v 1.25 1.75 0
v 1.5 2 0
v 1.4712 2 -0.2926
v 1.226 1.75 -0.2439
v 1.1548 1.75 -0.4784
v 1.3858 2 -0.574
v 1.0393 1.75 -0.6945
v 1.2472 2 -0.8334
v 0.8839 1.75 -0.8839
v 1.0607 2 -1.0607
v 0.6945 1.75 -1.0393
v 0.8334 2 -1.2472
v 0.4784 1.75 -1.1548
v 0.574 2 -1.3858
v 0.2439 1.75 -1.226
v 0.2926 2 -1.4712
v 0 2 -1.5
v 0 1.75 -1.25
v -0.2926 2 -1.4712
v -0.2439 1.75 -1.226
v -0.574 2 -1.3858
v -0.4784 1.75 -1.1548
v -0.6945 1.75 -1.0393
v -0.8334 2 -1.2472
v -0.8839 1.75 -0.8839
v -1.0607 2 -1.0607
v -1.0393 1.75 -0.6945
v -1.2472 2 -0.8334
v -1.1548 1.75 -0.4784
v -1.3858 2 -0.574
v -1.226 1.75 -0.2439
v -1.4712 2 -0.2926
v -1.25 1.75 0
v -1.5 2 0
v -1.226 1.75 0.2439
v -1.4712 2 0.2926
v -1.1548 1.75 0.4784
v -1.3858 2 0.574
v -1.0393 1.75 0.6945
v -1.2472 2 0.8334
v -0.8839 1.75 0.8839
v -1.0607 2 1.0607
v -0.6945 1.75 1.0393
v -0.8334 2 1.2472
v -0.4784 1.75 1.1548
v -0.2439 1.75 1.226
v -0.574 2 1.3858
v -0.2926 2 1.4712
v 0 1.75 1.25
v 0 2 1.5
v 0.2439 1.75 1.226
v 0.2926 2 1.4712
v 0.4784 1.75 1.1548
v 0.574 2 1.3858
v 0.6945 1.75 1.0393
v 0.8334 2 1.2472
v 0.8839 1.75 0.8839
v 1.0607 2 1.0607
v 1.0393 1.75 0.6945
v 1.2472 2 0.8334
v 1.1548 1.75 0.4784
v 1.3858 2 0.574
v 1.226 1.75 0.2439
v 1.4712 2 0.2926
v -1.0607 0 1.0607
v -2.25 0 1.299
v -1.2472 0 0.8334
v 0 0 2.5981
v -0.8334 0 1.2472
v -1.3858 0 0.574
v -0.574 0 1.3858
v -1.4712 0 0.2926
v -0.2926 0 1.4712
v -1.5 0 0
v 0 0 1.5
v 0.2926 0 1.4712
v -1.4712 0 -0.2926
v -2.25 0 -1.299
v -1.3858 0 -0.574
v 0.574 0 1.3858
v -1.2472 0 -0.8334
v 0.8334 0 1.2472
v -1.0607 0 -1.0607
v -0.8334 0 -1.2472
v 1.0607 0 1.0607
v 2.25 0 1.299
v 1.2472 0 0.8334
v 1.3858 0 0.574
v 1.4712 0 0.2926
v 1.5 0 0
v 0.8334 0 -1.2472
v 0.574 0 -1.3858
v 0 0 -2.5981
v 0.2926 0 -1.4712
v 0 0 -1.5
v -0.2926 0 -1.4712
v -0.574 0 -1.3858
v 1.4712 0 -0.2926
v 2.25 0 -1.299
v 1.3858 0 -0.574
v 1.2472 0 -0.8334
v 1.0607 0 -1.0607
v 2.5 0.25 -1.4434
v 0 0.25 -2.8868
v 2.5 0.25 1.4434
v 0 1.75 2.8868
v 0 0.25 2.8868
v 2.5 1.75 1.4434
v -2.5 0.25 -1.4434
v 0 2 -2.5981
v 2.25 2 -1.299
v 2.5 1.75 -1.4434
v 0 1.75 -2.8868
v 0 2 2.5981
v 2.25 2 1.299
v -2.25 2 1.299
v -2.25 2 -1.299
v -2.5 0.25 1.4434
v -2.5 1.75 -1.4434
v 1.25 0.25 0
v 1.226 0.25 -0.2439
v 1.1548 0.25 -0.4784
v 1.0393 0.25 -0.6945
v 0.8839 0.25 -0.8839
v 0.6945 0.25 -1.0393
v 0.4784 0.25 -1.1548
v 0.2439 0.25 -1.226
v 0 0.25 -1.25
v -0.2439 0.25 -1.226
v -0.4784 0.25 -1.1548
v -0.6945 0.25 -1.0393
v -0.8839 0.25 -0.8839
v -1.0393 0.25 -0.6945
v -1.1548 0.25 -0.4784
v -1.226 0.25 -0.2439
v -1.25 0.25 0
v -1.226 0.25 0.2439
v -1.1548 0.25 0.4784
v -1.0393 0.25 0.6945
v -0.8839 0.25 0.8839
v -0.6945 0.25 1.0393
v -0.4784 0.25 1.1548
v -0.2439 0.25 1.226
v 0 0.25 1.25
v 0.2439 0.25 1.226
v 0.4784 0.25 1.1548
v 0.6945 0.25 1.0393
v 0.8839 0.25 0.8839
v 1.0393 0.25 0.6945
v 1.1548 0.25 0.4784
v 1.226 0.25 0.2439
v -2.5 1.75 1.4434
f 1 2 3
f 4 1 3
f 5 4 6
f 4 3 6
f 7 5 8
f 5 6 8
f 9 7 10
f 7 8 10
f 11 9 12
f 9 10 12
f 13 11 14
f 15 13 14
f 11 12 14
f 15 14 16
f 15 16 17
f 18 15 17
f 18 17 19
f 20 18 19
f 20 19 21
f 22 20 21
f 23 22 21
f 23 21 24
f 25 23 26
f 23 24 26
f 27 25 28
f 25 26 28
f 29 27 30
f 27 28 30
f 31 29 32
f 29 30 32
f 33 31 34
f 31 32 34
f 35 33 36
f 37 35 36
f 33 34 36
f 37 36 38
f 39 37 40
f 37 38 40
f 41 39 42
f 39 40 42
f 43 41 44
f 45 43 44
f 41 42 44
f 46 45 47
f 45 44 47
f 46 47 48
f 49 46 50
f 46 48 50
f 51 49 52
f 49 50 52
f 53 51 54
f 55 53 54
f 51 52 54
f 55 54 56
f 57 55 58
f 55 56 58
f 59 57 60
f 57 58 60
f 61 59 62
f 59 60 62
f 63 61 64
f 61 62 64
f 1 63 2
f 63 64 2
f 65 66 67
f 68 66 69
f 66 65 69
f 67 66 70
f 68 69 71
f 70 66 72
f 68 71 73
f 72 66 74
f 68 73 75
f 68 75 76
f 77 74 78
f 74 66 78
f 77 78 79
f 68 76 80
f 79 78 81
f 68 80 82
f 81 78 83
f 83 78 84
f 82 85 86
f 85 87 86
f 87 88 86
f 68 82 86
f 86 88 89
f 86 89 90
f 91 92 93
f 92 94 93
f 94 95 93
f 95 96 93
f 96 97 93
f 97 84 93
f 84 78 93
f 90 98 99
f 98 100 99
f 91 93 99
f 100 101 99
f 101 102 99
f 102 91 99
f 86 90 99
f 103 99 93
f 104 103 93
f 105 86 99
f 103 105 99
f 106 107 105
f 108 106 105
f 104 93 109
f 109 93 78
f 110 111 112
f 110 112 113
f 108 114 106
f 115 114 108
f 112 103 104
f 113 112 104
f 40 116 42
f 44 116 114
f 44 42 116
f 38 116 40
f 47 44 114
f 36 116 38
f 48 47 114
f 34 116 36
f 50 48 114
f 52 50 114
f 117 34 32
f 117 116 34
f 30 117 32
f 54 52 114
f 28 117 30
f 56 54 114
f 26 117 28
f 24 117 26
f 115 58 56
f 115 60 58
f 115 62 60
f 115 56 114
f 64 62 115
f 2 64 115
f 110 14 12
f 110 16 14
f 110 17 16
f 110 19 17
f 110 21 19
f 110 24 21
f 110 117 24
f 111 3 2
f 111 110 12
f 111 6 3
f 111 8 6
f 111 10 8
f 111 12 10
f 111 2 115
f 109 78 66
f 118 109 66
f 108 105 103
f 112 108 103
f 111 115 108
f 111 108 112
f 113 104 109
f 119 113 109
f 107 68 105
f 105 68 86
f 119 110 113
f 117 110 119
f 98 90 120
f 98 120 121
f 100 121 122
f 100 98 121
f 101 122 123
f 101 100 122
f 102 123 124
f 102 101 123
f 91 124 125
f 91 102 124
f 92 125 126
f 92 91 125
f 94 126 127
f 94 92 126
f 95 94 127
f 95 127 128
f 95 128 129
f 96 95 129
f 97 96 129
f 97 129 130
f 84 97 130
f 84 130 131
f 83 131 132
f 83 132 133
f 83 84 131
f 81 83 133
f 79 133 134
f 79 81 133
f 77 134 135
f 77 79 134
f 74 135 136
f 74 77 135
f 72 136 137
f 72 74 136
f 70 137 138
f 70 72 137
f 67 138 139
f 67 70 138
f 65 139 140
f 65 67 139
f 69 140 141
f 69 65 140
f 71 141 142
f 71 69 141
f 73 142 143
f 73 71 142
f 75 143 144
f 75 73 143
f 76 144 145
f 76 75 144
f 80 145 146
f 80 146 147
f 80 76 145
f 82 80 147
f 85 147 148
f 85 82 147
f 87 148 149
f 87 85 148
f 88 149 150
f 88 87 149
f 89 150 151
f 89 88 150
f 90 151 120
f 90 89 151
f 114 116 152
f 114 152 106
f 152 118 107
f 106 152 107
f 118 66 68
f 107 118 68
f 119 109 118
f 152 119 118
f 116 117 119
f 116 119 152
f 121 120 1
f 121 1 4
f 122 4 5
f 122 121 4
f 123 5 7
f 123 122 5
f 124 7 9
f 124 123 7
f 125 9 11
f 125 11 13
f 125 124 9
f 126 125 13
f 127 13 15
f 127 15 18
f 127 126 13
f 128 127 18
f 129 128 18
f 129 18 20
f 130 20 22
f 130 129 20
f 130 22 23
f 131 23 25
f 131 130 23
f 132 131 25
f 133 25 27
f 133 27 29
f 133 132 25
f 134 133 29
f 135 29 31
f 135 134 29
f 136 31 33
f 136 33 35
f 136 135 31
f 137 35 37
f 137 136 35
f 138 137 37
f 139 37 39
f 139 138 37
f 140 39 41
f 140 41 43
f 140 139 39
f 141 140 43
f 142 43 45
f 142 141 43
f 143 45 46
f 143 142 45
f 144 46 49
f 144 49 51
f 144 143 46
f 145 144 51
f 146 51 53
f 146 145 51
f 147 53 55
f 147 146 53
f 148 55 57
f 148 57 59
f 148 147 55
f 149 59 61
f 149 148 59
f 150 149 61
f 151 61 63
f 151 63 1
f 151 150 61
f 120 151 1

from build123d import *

# Parameters (mm, degrees)
SKETCH1_R           = 1.25
BOSS_EXTRUDE1_DEPTH = 2
CHAMFER1_SIZE       = 0.25


with BuildPart() as part:
    # Sketch1 → Boss-Extrude1 (new body)
    with BuildSketch(Plane(origin=(0, 0, 0), x_dir=(1, 0, 0), z_dir=(0, 1, 0))):
        Polygon((0, -2.886751346), (2.5, -1.443375673), (2.5, 1.443375673), (0, 2.886751346), (-2.5, 1.443375673), (-2.5, -1.443375673), align=None)
        Circle(SKETCH1_R, mode=Mode.SUBTRACT)
    extrude(amount=BOSS_EXTRUDE1_DEPTH)

    # Chamfer1
    chamfer1_edges = [part.edges().sort_by_distance(p)[0] for p in [
        (2.5, 2, 0),
        (1.25, 2, -2.165063509),
        (-1.25, 0, 0),
        (-1.25, 2, 0),
        (-1.25, 2, -2.165063509),
        (-2.5, 2, 0),
        (-1.25, 2, 2.165063509),
        (-2.5, 0, 0),
        (-1.25, 0, -2.165063509),
        (1.25, 0, -2.165063509),
        (2.5, 0, 0),
        (1.25, 0, 2.165063509),
        (-1.25, 0, 2.165063509),
        (1.25, 2, 2.165063509),
    ]]
    chamfer(chamfer1_edges, length=CHAMFER1_SIZE)


solid = part.part
